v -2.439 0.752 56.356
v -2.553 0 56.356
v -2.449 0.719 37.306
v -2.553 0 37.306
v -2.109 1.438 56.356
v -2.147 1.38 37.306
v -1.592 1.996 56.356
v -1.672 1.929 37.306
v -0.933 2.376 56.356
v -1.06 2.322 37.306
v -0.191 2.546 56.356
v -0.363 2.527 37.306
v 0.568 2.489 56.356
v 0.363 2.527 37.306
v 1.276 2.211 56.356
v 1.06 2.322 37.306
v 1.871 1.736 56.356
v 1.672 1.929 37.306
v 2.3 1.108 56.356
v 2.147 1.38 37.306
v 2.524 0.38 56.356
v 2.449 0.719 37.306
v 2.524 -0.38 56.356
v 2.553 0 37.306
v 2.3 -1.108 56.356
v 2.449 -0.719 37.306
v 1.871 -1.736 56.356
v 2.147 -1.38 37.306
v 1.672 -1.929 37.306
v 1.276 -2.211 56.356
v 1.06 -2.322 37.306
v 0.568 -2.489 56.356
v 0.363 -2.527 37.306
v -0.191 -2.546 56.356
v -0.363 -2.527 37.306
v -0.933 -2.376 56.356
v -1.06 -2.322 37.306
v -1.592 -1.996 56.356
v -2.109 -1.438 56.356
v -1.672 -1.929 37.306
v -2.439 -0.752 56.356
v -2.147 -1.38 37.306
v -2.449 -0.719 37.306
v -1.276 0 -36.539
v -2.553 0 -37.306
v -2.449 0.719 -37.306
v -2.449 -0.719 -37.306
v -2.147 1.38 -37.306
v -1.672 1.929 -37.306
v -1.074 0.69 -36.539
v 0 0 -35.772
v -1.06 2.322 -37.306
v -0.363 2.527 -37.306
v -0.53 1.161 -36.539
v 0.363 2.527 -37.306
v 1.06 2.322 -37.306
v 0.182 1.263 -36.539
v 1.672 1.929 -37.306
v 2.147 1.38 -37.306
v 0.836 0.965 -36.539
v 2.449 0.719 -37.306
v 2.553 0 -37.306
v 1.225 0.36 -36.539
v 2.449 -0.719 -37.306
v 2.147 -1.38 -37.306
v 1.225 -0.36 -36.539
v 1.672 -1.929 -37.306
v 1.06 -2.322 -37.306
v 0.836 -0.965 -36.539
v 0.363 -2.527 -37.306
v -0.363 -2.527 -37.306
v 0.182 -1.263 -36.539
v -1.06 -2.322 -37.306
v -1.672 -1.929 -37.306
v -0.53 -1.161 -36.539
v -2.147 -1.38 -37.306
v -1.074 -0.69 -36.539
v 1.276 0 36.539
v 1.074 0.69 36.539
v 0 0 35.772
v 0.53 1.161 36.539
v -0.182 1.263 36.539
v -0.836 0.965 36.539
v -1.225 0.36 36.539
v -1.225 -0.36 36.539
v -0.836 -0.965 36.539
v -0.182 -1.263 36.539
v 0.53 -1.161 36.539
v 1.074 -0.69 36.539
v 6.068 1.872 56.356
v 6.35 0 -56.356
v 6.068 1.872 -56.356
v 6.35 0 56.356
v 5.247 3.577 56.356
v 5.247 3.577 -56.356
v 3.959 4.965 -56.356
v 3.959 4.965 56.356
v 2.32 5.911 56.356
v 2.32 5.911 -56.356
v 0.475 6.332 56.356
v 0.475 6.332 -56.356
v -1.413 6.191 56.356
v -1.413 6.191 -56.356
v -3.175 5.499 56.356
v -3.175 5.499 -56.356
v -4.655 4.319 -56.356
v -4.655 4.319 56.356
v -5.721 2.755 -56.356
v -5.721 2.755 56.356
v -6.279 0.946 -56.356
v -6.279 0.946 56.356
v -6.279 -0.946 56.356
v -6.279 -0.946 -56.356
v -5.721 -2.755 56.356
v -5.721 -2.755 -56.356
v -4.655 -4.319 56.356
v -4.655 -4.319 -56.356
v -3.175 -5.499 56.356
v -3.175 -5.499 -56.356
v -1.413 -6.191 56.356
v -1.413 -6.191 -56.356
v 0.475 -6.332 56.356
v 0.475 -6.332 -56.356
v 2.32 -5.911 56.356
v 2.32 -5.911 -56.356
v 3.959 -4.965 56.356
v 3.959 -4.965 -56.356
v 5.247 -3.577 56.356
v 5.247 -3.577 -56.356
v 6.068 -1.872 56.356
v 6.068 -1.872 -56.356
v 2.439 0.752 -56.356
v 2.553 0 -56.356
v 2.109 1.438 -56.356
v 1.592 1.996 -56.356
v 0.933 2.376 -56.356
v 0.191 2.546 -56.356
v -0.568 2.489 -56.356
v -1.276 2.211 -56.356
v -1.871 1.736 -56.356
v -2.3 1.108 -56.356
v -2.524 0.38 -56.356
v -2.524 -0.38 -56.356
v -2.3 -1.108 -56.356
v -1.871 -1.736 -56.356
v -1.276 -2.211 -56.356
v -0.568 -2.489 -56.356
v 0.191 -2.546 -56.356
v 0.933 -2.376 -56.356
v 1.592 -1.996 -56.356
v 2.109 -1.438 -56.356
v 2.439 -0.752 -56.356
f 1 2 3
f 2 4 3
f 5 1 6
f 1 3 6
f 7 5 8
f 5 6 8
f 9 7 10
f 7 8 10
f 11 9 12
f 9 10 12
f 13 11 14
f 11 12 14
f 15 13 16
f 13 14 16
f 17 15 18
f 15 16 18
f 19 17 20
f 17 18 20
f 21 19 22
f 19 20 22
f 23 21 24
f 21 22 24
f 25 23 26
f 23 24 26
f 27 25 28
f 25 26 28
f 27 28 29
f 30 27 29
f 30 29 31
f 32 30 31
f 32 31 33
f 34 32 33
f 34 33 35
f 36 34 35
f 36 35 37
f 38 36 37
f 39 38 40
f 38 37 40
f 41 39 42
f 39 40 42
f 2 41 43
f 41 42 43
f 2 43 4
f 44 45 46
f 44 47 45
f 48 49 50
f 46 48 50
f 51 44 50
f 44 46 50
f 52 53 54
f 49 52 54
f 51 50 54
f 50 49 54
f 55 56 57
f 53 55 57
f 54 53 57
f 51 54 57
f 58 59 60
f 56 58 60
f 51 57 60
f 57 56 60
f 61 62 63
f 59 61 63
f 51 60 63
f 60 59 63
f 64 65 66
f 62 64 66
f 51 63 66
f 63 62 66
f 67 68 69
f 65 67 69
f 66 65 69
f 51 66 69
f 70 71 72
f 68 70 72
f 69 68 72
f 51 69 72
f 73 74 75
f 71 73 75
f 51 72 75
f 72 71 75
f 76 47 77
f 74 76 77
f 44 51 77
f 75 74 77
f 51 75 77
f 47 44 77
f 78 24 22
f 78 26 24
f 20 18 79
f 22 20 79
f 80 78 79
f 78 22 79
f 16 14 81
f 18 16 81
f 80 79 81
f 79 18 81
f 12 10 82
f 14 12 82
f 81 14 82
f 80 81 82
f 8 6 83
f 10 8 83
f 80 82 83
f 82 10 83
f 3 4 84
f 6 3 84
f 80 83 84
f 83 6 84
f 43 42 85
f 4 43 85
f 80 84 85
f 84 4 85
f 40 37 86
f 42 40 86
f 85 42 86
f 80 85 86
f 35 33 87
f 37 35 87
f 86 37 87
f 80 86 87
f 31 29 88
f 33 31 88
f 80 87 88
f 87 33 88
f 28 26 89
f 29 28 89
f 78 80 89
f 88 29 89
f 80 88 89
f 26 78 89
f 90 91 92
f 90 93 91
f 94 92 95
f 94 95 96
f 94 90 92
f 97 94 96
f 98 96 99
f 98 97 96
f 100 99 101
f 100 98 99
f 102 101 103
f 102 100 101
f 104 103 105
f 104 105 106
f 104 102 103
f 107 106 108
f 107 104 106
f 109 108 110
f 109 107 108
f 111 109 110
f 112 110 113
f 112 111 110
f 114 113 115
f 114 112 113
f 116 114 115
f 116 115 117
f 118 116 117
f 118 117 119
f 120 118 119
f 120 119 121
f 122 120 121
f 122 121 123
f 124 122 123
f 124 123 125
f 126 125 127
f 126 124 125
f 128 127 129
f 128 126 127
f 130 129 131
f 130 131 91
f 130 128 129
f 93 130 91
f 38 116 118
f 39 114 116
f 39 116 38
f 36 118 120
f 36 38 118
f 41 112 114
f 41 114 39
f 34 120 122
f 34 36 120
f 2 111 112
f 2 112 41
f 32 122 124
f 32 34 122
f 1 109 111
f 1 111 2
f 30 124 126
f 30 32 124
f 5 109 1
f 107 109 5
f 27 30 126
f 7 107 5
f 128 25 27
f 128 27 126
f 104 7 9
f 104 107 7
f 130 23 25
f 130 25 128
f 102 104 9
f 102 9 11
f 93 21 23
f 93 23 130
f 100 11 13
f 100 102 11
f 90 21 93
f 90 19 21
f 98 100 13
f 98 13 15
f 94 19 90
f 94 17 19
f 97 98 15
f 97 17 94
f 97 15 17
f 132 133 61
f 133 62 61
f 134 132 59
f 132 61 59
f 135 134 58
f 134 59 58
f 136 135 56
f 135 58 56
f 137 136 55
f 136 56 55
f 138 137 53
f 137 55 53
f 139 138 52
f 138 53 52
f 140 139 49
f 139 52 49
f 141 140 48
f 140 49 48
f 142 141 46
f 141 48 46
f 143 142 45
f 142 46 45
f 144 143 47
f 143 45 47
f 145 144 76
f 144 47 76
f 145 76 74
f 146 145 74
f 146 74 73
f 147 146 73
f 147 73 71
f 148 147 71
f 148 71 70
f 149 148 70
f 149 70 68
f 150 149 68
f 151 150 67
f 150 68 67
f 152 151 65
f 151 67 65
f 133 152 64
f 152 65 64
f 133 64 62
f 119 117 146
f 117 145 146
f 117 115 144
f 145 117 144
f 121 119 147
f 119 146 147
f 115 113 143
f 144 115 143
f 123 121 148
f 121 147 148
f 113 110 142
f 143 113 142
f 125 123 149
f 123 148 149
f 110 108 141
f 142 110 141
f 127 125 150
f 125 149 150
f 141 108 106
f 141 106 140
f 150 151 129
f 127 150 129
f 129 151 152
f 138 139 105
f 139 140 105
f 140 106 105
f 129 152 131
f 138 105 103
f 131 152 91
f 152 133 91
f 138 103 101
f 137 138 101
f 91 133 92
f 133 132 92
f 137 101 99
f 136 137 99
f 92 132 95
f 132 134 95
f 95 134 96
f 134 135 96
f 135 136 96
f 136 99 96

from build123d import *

# Parameters (mm, degrees)
SKETCH1_R                   = 6.35
EXTRUDE1_DEPTH              = 56.35625
F_1_4_20_TAPPED_HOLE1_D     = 5.1054
F_1_4_20_TAPPED_HOLE1_DEPTH = 19.05
F_1_4_20_TAPPED_HOLE1_TIP   = 1.533816902
F_1_4_20_TAPPED_HOLE2_D     = 5.1054
F_1_4_20_TAPPED_HOLE2_DEPTH = 19.05
F_1_4_20_TAPPED_HOLE2_TIP   = 1.533816902


with BuildPart() as part:
    # Sketch1 → Extrude1 (new body, symmetric)
    with BuildSketch(Plane.XY):
        Circle(SKETCH1_R)
    extrude(amount=EXTRUDE1_DEPTH, both=True)

    # 1/4-20 Tapped Hole1
    with Locations(Plane.XY.offset(56.35625)):
        with Locations((0, 0)):
            Hole(F_1_4_20_TAPPED_HOLE1_D / 2, depth=F_1_4_20_TAPPED_HOLE1_DEPTH)
            with Locations((0, 0, -(F_1_4_20_TAPPED_HOLE1_DEPTH + F_1_4_20_TAPPED_HOLE1_TIP / 2))):  # 118° drill point
                Cone(0, F_1_4_20_TAPPED_HOLE1_D / 2, F_1_4_20_TAPPED_HOLE1_TIP, mode=Mode.SUBTRACT)

    # 1/4-20 Tapped Hole2
    with Locations(Plane(origin=(0, 0, -56.35625), x_dir=(-1, 0, 0), z_dir=(0, 0, -1))):
        with Locations((0, 0)):
            Hole(F_1_4_20_TAPPED_HOLE2_D / 2, depth=F_1_4_20_TAPPED_HOLE2_DEPTH)
            with Locations((0, 0, -(F_1_4_20_TAPPED_HOLE2_DEPTH + F_1_4_20_TAPPED_HOLE2_TIP / 2))):  # 118° drill point
                Cone(0, F_1_4_20_TAPPED_HOLE2_D / 2, F_1_4_20_TAPPED_HOLE2_TIP, mode=Mode.SUBTRACT)


solid = part.part
